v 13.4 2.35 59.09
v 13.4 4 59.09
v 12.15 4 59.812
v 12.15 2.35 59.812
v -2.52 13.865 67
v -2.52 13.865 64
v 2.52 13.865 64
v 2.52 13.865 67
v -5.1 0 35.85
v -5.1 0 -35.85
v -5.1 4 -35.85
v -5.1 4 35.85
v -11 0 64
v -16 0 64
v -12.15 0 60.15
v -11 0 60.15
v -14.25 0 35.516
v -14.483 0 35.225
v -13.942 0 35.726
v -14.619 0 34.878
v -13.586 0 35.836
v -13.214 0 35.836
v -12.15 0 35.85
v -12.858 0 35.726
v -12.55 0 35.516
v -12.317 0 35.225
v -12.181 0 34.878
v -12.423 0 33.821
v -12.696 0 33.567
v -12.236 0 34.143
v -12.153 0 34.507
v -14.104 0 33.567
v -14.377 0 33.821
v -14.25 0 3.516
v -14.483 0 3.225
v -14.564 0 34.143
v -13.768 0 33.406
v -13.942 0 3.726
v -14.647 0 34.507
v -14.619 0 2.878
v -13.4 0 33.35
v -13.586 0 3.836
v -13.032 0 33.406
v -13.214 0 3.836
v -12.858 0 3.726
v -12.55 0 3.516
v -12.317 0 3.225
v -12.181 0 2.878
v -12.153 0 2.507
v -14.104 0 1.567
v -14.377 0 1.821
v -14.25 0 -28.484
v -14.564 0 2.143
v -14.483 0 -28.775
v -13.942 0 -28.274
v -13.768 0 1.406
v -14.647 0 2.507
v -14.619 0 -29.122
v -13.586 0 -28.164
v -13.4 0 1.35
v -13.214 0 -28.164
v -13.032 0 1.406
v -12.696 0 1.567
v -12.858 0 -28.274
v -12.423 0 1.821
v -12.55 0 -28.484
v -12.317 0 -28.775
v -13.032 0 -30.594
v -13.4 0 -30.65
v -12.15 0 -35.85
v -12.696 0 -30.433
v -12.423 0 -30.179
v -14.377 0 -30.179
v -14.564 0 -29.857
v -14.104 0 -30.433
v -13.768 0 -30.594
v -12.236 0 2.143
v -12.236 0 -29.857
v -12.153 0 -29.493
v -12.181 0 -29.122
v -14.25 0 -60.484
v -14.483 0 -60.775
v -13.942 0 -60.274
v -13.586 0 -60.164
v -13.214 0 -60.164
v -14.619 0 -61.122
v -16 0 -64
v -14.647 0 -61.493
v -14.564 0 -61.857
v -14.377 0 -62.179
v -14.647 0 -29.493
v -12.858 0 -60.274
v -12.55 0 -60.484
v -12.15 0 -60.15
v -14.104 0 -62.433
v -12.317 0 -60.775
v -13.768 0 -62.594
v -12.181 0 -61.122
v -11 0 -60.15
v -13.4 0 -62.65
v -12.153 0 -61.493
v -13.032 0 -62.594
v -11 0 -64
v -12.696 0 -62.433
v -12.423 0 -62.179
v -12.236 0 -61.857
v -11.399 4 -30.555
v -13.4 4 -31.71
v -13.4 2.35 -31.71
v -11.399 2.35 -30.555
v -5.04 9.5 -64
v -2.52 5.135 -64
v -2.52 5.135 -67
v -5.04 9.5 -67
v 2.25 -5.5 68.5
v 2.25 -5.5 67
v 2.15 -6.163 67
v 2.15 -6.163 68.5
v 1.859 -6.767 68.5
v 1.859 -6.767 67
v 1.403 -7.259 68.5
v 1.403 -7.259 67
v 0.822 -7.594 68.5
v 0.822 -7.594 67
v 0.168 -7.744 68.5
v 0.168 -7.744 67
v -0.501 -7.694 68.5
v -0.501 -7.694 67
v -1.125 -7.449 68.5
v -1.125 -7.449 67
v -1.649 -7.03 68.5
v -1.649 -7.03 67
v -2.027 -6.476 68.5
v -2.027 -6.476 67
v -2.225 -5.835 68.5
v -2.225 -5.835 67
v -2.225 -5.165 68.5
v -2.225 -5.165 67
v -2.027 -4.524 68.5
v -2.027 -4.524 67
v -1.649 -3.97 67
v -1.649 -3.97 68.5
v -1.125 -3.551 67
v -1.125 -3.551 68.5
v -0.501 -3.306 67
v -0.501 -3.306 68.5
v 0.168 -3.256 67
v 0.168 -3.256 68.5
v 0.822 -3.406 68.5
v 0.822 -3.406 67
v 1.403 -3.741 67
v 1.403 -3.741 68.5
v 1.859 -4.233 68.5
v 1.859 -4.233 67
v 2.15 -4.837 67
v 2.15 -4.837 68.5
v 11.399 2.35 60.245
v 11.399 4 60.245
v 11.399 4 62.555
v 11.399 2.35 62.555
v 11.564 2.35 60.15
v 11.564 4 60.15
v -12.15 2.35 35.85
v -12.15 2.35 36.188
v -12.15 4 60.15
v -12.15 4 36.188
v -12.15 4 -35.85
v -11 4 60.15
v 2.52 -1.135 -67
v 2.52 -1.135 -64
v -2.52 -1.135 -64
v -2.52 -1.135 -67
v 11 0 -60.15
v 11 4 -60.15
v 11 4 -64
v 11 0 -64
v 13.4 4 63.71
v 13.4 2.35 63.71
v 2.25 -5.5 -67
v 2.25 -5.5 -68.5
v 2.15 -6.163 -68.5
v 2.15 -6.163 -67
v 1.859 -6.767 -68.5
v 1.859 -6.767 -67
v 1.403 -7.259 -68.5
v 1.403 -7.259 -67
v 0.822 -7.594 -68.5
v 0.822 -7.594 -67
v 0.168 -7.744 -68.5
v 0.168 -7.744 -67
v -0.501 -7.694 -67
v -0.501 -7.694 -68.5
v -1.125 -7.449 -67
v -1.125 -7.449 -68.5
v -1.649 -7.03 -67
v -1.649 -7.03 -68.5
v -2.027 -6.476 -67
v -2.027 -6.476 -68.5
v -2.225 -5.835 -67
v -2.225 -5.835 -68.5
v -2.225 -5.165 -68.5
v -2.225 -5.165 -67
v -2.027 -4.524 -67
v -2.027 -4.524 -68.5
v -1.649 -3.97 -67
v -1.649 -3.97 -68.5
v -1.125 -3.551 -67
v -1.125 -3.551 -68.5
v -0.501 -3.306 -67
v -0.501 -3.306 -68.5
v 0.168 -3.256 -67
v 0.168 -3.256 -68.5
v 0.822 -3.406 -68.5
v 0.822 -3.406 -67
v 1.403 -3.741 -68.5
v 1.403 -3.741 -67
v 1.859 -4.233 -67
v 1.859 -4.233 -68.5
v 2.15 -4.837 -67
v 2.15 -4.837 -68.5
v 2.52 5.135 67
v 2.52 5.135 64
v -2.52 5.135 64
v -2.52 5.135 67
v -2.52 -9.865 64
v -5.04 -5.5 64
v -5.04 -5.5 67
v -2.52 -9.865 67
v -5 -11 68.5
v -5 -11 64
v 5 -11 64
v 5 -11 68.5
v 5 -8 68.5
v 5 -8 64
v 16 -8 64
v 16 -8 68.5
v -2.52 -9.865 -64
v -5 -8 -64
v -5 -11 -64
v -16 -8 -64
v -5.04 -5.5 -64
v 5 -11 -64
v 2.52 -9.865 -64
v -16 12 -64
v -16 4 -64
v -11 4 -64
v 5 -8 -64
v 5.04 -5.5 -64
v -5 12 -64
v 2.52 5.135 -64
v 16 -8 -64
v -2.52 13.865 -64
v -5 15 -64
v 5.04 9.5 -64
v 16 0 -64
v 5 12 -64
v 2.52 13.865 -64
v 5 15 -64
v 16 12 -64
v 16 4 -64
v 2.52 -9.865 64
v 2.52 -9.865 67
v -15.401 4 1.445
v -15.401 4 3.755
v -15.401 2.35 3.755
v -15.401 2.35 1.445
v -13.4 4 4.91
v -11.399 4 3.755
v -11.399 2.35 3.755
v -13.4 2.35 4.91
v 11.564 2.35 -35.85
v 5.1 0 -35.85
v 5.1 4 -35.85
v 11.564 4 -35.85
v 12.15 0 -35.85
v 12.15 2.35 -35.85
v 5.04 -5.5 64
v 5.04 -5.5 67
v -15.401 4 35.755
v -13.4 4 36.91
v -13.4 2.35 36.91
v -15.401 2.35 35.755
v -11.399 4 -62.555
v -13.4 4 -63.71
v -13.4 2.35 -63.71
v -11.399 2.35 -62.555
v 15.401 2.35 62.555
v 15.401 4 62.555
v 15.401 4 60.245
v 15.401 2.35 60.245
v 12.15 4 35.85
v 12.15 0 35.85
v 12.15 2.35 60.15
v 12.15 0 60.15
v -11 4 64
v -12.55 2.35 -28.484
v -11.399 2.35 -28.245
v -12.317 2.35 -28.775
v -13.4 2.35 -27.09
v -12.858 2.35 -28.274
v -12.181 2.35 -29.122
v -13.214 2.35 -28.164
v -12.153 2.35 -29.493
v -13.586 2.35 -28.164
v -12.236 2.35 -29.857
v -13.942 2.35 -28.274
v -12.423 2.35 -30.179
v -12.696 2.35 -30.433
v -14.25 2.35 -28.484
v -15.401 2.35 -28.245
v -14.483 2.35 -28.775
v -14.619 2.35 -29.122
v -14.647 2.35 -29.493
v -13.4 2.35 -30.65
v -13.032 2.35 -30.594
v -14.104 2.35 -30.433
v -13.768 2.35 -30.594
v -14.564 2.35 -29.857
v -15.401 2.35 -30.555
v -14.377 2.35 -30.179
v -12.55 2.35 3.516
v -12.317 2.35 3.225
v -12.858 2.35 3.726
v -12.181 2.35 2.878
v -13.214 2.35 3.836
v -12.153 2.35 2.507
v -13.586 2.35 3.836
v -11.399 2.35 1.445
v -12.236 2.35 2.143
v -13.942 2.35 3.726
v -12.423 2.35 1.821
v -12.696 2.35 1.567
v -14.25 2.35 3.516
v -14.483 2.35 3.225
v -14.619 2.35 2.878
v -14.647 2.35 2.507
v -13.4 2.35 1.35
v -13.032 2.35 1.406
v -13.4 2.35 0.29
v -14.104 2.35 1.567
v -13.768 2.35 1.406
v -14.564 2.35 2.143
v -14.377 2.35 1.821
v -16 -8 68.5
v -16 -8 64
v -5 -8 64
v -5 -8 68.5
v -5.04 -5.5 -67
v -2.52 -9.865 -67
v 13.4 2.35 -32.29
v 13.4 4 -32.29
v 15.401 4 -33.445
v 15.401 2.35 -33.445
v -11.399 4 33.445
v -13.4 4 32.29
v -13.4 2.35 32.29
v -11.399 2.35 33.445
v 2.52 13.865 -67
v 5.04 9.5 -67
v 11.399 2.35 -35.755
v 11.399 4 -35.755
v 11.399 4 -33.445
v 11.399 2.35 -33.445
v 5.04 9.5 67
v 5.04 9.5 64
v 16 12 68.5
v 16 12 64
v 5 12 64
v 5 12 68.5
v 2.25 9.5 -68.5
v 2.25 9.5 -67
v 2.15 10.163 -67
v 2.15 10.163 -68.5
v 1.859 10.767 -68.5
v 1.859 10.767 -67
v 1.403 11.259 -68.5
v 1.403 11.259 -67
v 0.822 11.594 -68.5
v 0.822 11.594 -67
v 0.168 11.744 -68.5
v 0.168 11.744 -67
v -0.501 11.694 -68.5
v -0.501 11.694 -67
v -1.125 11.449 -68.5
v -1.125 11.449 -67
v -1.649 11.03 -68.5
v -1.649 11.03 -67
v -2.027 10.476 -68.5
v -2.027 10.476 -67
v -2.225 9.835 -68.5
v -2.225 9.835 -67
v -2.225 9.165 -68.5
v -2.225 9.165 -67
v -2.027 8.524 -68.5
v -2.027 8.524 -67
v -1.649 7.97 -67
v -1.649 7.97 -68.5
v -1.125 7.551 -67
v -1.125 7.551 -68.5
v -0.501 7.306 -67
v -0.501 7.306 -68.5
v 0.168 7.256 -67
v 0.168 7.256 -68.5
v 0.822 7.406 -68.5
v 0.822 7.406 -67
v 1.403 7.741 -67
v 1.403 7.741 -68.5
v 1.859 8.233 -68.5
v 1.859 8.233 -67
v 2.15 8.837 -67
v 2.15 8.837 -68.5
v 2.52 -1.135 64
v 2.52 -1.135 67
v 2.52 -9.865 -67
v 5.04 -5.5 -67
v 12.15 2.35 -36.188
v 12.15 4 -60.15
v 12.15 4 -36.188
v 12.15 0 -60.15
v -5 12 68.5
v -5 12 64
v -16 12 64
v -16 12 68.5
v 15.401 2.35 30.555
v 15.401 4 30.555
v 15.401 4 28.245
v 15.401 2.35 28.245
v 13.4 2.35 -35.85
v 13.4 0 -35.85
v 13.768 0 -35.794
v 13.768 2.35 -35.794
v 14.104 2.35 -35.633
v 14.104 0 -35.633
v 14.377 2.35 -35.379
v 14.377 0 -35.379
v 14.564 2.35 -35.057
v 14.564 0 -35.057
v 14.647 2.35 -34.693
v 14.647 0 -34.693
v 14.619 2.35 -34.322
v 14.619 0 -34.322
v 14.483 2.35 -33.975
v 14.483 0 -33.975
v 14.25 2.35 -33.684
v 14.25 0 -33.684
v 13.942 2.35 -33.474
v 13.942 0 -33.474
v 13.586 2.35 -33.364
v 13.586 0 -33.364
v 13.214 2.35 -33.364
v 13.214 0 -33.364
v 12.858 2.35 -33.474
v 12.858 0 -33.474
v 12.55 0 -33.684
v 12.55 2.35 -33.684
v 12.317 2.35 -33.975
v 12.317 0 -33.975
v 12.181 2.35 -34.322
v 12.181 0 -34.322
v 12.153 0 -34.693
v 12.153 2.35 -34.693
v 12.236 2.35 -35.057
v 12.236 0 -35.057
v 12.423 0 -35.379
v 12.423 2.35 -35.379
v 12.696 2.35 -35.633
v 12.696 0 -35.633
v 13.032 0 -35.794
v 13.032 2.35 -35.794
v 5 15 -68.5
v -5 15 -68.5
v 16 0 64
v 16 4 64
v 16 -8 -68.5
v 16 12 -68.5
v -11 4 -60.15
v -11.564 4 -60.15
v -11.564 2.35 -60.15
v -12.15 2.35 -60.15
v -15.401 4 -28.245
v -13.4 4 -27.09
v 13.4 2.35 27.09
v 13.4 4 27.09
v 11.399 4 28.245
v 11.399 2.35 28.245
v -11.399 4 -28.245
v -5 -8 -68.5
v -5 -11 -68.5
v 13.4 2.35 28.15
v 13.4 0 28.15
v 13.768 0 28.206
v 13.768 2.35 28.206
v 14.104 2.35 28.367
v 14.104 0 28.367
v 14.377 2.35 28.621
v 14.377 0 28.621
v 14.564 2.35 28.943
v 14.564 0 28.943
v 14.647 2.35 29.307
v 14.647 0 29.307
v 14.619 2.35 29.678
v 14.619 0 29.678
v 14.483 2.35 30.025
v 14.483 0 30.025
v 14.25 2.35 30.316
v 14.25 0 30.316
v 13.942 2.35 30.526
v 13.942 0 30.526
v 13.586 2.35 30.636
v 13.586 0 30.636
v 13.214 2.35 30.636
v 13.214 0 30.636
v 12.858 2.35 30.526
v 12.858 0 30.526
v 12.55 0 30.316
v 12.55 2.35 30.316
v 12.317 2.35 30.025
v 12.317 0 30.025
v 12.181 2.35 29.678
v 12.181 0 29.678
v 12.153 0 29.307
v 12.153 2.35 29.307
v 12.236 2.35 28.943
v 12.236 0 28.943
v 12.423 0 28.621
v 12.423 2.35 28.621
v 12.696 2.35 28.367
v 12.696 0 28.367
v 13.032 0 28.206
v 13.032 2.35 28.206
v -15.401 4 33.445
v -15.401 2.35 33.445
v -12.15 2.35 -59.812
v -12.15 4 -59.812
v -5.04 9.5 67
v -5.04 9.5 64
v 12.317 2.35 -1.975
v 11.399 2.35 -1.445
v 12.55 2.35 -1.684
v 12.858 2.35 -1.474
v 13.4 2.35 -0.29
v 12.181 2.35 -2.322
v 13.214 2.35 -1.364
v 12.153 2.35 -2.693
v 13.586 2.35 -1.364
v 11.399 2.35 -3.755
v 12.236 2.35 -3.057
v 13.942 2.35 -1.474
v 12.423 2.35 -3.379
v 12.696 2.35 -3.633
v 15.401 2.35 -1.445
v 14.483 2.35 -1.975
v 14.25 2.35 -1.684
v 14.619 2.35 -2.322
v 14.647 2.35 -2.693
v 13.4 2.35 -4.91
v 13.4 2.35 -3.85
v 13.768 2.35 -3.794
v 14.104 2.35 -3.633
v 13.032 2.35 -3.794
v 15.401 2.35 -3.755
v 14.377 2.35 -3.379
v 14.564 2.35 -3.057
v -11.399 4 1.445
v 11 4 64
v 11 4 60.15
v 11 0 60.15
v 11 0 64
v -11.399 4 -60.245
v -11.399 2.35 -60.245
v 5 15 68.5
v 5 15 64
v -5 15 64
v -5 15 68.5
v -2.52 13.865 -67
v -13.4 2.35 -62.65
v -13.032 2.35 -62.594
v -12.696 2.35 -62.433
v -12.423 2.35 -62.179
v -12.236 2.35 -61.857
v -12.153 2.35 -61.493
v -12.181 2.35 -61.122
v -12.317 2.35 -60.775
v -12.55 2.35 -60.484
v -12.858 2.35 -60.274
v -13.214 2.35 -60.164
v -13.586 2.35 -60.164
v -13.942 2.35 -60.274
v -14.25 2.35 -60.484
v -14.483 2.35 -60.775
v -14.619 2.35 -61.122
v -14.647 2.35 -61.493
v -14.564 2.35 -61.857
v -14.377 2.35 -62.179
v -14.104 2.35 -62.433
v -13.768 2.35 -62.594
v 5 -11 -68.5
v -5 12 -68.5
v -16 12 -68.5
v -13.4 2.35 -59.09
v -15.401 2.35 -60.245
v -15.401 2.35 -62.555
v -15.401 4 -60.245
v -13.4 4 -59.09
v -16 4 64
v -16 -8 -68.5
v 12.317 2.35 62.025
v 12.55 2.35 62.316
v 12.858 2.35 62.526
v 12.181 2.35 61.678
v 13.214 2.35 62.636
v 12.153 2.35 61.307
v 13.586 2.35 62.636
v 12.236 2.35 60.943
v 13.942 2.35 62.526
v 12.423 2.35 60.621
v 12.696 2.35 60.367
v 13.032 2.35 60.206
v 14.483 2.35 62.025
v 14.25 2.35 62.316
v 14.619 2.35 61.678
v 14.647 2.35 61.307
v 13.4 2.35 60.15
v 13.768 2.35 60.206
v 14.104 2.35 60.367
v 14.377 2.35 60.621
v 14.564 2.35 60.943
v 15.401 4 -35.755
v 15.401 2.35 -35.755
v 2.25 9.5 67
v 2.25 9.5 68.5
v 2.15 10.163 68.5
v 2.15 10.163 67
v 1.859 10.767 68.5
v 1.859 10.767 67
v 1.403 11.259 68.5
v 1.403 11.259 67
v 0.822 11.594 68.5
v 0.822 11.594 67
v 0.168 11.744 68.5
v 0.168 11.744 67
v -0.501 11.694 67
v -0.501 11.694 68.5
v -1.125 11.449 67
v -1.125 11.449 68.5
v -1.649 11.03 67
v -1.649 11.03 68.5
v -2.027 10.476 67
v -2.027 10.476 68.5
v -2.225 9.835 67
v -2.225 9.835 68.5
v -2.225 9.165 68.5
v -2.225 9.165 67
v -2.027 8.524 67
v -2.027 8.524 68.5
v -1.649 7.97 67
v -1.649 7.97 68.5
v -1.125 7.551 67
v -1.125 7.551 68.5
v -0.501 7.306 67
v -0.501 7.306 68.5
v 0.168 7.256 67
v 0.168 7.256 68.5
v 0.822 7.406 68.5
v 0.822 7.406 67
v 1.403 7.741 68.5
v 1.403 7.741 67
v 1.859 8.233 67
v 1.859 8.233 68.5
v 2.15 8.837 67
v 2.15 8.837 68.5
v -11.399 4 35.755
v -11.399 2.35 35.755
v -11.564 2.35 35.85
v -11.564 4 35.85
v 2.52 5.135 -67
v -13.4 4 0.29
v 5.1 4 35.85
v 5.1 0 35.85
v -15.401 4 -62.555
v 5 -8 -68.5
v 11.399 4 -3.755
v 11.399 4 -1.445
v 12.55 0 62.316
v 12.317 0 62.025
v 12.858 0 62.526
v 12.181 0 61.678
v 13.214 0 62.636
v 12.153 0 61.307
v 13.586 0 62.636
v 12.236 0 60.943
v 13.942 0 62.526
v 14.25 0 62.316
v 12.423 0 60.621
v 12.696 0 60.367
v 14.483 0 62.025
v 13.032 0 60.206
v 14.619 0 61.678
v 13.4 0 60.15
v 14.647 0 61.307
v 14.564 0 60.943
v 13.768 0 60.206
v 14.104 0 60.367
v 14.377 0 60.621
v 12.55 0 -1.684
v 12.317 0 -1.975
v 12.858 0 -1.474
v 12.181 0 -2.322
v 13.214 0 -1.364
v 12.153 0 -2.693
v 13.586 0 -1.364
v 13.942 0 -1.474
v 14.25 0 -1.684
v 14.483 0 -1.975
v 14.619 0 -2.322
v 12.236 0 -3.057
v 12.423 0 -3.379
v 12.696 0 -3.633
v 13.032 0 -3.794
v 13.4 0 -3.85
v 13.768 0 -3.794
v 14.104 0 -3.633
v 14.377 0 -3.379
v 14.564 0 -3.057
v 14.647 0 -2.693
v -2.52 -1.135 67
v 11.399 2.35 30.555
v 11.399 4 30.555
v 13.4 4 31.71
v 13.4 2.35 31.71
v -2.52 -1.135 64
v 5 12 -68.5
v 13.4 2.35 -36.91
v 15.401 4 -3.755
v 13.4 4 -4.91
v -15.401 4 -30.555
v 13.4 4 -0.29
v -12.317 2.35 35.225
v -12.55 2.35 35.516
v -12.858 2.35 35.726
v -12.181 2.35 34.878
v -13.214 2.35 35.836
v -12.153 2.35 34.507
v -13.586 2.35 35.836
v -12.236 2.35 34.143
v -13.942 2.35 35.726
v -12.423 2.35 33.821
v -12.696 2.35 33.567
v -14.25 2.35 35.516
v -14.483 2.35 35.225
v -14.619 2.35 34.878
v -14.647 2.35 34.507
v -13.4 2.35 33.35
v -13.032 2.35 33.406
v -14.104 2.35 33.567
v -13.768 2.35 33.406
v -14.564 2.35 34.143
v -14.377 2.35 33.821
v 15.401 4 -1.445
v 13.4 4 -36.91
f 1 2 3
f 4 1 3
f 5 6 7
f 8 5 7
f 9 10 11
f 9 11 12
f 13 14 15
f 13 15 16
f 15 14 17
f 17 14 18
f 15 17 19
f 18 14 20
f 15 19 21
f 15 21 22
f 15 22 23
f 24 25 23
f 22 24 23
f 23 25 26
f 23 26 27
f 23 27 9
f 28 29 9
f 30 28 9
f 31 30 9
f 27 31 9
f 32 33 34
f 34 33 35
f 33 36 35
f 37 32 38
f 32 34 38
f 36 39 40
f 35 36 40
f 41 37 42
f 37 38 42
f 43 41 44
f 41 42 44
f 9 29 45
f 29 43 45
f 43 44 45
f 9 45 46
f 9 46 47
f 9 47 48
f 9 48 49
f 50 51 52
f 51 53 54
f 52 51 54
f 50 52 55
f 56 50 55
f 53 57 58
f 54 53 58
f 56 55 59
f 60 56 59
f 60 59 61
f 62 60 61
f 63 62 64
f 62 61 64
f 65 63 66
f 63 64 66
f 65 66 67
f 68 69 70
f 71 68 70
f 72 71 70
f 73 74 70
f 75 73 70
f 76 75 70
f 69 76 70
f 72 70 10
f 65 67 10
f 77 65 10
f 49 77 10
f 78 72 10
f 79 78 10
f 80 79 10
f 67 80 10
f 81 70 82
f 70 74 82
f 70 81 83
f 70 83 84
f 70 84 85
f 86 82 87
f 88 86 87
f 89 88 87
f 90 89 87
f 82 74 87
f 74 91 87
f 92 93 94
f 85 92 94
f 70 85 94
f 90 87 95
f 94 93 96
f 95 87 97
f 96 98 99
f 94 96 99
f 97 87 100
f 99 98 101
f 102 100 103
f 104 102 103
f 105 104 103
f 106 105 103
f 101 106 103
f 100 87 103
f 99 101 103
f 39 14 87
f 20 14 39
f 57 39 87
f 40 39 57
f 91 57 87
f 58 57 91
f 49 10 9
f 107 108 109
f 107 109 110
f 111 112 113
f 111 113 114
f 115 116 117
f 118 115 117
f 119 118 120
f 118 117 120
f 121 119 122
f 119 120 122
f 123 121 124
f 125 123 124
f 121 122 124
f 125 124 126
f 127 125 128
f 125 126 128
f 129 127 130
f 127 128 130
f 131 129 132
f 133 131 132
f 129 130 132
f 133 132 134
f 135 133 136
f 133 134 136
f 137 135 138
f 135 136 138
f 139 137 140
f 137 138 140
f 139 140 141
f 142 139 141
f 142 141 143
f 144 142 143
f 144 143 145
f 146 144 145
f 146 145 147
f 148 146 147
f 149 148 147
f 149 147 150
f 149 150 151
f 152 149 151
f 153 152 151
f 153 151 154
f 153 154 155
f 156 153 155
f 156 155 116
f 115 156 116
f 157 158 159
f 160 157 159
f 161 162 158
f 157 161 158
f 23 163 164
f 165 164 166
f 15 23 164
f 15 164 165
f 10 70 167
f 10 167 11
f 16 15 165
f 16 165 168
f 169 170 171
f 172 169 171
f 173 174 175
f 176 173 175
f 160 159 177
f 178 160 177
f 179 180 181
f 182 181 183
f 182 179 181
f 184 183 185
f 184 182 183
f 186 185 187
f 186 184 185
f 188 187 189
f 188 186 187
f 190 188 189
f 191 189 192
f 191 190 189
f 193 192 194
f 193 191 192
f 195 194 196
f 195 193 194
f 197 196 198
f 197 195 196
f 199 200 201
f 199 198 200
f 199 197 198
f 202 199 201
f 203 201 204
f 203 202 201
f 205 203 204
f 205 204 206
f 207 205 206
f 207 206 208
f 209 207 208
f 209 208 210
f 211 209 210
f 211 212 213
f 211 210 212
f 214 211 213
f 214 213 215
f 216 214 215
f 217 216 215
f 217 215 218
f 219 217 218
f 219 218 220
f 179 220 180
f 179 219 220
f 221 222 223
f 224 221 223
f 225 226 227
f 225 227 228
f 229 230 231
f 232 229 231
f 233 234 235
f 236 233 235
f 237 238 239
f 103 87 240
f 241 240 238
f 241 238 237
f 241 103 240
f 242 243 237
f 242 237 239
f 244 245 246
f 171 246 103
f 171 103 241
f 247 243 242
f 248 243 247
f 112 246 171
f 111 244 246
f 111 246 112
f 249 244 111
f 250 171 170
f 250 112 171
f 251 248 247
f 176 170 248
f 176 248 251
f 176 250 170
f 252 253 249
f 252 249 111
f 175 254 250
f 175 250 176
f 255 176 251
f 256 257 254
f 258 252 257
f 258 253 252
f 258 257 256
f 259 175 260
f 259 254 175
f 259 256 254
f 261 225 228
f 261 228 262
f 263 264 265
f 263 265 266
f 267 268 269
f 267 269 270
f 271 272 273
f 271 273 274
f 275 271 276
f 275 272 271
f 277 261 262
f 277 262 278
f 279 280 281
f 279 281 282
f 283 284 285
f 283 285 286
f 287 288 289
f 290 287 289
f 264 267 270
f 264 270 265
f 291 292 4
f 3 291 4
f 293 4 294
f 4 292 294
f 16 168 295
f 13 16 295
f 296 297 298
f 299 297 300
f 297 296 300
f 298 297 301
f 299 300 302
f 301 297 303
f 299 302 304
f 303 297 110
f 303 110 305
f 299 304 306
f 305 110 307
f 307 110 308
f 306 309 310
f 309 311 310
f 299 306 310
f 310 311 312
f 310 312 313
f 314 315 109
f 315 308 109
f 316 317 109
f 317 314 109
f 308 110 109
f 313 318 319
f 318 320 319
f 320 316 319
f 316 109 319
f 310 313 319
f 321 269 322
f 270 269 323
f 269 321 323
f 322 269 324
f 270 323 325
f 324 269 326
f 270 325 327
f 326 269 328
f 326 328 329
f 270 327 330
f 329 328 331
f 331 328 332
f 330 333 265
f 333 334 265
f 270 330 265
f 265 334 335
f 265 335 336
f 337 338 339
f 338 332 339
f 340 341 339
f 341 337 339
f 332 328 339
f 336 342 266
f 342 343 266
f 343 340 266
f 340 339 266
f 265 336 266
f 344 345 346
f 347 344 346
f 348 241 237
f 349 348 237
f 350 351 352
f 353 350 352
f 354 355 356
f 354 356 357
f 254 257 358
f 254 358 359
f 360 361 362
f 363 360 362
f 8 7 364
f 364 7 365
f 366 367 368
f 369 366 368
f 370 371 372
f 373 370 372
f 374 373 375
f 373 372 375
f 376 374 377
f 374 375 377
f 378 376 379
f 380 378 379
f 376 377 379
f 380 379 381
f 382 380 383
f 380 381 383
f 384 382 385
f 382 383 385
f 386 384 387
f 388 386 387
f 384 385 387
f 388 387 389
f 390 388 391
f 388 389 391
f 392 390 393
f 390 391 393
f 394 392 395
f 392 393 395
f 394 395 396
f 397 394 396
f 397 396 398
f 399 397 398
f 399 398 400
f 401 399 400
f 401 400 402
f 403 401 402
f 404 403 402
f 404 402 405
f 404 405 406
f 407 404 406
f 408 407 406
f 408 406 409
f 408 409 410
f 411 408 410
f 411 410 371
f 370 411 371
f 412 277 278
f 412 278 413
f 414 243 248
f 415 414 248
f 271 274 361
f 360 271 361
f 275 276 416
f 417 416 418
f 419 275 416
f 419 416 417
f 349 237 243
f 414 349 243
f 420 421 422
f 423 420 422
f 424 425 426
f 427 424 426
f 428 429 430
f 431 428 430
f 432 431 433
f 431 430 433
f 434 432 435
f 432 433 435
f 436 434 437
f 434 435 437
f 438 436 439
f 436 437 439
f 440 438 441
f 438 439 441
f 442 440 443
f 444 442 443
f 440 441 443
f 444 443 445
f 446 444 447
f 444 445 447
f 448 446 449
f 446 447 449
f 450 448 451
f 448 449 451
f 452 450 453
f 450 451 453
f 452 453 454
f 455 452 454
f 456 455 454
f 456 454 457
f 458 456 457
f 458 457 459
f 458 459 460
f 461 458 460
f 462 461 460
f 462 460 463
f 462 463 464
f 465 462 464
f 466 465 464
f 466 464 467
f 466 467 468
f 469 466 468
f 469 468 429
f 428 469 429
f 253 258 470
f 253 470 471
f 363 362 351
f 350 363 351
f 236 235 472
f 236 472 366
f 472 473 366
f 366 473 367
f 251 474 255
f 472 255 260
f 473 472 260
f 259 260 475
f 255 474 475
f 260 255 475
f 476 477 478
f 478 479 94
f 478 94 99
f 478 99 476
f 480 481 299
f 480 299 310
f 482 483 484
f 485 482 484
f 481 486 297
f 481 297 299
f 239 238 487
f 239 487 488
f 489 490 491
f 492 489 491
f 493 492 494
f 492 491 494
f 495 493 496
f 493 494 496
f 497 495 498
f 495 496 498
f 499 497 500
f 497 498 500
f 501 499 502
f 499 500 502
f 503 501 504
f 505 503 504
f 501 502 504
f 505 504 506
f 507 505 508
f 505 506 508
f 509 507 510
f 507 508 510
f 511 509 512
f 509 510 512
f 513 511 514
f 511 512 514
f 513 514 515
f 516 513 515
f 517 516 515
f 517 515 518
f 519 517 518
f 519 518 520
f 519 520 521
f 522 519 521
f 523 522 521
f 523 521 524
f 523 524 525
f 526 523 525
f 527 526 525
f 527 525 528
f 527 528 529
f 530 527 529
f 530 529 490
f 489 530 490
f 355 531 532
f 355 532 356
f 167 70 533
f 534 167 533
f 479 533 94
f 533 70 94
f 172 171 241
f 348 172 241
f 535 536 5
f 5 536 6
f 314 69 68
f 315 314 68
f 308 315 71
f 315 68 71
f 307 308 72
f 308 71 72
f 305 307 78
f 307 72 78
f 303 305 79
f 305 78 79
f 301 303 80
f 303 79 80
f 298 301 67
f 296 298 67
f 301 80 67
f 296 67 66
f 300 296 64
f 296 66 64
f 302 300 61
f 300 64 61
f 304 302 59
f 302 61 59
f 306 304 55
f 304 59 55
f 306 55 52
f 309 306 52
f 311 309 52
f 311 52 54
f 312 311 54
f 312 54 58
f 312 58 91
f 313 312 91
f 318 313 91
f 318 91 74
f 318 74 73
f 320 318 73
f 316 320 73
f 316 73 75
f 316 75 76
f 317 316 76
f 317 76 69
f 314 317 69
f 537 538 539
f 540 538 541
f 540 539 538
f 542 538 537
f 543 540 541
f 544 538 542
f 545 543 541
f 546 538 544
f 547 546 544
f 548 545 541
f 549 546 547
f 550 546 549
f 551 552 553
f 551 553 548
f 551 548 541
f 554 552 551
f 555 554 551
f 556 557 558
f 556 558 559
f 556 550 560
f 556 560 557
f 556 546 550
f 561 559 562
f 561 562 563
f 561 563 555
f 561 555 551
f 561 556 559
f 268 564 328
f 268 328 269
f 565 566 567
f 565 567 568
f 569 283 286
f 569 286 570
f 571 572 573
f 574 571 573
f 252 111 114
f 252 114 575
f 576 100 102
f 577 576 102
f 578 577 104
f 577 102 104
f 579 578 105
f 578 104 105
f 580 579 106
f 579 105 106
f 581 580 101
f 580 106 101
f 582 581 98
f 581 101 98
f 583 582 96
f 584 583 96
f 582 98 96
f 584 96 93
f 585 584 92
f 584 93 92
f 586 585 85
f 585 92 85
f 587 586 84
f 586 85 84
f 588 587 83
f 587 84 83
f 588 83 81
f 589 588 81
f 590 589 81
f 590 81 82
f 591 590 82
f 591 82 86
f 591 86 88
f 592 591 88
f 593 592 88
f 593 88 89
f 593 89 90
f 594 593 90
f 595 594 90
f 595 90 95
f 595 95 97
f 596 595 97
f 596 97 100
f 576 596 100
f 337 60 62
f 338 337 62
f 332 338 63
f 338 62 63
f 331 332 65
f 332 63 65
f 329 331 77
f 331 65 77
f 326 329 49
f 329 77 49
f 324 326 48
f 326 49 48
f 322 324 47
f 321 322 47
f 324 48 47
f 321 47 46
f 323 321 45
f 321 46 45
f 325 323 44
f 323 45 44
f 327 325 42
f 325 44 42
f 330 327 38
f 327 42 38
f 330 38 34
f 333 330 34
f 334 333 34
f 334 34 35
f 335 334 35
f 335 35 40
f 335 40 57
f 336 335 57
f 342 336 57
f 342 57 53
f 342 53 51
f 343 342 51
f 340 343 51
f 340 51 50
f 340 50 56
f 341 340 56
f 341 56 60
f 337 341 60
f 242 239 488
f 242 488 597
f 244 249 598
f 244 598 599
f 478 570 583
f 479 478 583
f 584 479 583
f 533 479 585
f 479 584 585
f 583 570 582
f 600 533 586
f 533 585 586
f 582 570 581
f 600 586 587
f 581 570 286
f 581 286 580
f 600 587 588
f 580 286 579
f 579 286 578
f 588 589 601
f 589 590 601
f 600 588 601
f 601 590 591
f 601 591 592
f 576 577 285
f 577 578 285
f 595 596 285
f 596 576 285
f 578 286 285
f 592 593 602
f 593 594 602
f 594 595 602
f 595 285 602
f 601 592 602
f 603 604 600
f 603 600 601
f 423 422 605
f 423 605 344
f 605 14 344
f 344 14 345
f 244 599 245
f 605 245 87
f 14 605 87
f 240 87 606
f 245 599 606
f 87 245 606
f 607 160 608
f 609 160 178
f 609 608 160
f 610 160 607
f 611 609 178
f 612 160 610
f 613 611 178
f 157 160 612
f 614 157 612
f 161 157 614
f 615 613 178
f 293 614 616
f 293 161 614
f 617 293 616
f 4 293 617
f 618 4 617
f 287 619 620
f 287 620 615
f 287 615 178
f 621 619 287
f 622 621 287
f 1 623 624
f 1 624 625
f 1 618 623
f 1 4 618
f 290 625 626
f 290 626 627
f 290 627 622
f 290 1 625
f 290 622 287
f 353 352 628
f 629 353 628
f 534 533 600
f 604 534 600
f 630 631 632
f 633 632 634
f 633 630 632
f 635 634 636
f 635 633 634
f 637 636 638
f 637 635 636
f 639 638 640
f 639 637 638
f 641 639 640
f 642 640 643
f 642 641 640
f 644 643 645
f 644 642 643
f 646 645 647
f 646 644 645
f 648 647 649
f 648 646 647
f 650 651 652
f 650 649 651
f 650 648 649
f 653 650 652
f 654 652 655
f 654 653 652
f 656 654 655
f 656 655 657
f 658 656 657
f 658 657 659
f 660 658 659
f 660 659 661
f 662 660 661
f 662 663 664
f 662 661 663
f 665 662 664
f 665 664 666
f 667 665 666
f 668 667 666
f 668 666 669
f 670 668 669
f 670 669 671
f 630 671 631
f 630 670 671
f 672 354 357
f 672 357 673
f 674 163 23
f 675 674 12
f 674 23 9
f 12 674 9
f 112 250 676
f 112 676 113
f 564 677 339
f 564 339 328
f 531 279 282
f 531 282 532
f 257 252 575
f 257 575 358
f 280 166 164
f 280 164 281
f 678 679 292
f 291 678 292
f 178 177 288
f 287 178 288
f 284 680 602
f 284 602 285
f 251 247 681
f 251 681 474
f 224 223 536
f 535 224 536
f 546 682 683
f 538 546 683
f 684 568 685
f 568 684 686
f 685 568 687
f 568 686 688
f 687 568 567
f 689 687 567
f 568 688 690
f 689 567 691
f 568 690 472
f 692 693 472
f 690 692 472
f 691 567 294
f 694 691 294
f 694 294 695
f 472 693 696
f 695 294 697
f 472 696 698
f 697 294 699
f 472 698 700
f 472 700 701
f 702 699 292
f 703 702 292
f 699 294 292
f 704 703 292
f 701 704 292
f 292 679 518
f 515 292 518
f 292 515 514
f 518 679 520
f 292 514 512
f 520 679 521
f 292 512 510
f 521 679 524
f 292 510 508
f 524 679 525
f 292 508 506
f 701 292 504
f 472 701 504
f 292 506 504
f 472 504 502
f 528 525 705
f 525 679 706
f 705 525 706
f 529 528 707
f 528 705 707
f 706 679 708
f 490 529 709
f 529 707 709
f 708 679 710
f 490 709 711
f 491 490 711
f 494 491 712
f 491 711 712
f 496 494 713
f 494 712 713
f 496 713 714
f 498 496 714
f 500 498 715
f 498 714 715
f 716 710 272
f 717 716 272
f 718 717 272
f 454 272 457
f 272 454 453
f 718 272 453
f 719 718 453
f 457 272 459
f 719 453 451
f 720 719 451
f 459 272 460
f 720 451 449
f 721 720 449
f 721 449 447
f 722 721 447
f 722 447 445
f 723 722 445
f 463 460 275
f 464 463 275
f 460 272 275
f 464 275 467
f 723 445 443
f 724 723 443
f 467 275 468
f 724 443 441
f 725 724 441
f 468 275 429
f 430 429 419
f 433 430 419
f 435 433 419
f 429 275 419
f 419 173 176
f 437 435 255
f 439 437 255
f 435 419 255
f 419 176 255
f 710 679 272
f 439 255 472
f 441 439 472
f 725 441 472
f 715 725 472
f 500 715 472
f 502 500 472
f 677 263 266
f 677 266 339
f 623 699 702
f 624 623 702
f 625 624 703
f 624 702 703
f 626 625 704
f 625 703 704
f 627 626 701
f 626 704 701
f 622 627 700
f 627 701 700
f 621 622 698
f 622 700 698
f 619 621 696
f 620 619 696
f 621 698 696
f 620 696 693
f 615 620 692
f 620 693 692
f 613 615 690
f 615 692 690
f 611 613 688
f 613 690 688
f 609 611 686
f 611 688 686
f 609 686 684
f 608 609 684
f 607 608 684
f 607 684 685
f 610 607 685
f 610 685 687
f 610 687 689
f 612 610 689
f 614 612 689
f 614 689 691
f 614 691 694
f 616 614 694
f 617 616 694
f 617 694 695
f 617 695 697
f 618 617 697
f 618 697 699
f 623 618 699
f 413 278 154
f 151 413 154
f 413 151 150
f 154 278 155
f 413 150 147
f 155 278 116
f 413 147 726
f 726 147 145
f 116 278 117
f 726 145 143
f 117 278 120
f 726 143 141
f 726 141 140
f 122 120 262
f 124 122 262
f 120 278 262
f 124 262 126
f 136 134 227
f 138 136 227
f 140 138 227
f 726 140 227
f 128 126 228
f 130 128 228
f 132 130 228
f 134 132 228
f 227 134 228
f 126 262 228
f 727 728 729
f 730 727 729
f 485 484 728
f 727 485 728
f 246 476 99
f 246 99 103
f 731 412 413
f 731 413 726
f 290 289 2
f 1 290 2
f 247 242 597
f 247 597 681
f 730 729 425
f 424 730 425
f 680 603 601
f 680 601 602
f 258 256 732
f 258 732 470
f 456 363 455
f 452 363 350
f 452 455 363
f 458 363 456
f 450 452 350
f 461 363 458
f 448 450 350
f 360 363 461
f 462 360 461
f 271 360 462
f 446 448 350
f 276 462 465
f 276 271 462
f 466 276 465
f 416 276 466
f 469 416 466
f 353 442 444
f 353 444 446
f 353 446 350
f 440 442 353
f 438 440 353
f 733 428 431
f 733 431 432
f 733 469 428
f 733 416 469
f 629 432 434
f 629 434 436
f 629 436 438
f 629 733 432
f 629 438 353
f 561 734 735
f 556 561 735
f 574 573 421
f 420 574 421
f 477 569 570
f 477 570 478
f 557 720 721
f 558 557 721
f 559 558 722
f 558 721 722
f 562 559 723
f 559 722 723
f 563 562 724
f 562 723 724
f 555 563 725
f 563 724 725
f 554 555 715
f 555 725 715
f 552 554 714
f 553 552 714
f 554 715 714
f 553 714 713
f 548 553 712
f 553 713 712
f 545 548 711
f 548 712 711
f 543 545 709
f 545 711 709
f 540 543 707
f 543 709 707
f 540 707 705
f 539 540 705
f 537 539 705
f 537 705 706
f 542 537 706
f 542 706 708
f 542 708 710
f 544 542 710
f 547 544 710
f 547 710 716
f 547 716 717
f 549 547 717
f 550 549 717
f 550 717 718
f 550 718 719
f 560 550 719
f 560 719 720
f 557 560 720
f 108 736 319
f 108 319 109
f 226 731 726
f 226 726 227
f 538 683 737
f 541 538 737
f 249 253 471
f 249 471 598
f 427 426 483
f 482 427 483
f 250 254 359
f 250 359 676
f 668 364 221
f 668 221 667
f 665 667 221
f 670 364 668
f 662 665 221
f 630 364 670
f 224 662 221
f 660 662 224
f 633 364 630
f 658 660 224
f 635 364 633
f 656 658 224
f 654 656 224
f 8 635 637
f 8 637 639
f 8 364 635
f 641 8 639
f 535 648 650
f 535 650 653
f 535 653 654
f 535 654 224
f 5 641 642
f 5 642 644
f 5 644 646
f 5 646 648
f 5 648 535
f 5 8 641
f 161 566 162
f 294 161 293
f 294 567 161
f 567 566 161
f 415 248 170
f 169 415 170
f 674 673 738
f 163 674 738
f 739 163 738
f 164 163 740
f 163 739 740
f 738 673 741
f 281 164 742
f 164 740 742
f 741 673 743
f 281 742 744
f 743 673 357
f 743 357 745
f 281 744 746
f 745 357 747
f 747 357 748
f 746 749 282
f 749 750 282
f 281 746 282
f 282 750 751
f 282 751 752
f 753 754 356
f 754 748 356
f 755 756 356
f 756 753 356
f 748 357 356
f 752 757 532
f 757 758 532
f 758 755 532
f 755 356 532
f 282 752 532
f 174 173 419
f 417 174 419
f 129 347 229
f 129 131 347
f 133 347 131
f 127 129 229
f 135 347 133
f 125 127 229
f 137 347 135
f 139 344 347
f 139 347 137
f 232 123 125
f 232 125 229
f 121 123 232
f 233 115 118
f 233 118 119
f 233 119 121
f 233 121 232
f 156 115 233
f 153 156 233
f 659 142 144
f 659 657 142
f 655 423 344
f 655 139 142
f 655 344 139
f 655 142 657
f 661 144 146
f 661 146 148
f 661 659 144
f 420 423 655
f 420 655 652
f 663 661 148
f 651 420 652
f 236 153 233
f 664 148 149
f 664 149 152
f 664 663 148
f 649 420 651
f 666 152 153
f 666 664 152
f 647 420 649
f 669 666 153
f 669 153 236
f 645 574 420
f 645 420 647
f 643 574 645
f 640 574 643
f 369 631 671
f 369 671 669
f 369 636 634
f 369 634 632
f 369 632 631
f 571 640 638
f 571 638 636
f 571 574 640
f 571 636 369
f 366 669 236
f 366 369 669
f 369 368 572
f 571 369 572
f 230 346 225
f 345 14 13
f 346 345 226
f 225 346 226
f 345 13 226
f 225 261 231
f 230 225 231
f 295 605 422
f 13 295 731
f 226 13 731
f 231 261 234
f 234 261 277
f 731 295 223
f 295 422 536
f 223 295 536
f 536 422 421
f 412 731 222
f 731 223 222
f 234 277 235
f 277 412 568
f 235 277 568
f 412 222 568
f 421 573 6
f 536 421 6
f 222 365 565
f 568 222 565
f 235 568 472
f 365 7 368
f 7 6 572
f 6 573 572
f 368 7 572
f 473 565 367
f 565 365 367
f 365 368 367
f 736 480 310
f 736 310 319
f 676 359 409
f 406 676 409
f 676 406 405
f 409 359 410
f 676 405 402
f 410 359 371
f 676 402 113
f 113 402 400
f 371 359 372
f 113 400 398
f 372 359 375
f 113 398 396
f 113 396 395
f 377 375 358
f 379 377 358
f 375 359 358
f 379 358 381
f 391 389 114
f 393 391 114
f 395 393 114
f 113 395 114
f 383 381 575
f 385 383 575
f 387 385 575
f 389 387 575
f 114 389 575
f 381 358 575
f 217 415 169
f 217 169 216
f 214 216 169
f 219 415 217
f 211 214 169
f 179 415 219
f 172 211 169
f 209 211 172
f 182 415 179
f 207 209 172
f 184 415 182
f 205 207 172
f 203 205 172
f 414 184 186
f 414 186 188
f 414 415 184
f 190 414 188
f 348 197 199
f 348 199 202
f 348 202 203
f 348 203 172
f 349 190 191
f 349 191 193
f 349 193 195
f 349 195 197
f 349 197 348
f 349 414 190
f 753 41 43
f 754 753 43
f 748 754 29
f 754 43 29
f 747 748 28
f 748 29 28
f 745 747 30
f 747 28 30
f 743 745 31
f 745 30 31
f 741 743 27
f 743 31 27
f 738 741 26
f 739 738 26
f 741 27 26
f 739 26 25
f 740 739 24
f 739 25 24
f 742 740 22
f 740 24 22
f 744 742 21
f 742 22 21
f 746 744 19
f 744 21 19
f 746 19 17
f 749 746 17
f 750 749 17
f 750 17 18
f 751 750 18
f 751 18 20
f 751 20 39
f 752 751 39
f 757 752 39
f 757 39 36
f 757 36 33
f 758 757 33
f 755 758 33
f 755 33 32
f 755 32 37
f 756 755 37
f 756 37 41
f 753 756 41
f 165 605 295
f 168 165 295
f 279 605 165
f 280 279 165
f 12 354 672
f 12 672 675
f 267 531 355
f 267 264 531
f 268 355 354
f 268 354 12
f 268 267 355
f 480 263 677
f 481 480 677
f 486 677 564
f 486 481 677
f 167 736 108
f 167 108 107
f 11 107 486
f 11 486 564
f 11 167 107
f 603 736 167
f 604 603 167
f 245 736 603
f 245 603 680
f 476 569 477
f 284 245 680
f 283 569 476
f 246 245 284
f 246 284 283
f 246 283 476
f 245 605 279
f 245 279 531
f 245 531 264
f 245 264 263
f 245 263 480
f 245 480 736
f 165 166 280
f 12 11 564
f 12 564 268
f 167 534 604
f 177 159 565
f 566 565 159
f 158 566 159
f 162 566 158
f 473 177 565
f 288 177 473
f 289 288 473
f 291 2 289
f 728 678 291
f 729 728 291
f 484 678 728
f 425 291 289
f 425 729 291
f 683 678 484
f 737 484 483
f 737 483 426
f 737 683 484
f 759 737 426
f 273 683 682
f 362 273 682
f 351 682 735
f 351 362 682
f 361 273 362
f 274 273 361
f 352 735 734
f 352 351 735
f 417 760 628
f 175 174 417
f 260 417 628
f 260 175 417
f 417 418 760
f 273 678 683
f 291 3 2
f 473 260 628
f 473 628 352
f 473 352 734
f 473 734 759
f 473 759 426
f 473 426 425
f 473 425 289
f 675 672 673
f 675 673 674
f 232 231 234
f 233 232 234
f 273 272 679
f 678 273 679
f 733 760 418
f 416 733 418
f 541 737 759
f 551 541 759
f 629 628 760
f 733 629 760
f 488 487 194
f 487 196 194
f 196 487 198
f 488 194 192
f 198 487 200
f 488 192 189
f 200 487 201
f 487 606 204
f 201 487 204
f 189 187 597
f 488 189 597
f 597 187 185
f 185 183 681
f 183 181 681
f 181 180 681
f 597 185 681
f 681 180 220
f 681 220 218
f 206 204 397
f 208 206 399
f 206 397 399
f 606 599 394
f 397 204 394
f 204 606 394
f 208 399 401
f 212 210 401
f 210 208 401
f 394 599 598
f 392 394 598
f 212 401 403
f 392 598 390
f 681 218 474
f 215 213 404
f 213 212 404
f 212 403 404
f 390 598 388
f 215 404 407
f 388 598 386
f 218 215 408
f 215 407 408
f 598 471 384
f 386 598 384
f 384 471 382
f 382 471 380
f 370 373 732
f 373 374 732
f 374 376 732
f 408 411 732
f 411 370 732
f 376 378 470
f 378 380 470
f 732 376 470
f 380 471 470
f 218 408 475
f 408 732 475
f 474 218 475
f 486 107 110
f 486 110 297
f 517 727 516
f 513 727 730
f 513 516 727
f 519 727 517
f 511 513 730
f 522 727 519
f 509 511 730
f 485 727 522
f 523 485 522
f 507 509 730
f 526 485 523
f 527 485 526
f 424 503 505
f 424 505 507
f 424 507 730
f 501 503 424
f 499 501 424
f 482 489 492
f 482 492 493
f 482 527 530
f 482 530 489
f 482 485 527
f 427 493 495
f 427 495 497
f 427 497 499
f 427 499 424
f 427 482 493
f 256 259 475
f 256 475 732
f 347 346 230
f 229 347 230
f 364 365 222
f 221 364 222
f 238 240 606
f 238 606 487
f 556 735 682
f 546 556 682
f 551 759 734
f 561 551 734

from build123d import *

# Parameters (mm, degrees)
SKETCH1_W               = 32
SKETCH1_H               = 128
BOSS_EXTRUDE1_DEPTH     = 4
SKETCH4_R               = 1.25
CUT_EXTRUDE2_DEPTH      = 10
SKETCH5_R               = 1.25
CUT_EXTRUDE3_DEPTH      = 10
CUT_EXTRUDE4_DEPTH      = 1.65
LPATTERN3_COUNT         = 4
LPATTERN3_PITCH         = 32
CUT_EXTRUDE5_DEPTH      = 1.65
LPATTERN4_COUNT         = 4
LPATTERN4_PITCH         = 32
SKETCH8_W               = 24.3
SKETCH8_H               = 24.3
CUT_EXTRUDE6_DEPTH      = 10
BOSS_EXTRUDE2_DEPTH     = 4.5
SKETCH11_W              = 10.2
SKETCH11_H              = 71.7
CUT_EXTRUDE7_DEPTH      = 72.92530848
CUT_EXTRUDE8_DEPTH      = 3
SKETCH12_R              = 2.25
CUT_EXTRUDE9_DEPTH      = 3
MIRROR3_COPY_1_DEPTH    = 3
MIRROR3_COPY_2_SKETCH_R = 2.25
MIRROR3_COPY_2_DEPTH    = 3
SKETCH14_W              = 22
SKETCH14_H              = 3.85
CUT_EXTRUDE13_DEPTH     = 10


with BuildPart() as part:
    # Sketch1 → Boss-Extrude1 (new body)
    with BuildSketch(Plane(origin=(0, 0, 0), x_dir=(1, 0, 0), z_dir=(0, 1, 0))):
        Rectangle(SKETCH1_W, SKETCH1_H)
    extrude(amount=BOSS_EXTRUDE1_DEPTH)

    # Sketch4 → Cut-Extrude2 (cut)
    with BuildSketch(Plane.XZ):
        with Locations(Location((13.4, 61.4, 0), (0, 0, 270))):
            Circle(SKETCH4_R)
    cut_extrude2 = extrude(amount=-CUT_EXTRUDE2_DEPTH, mode=Mode.SUBTRACT)

    # Sketch5 → Cut-Extrude3 (cut)
    with BuildSketch(Plane.XZ):
        with Locations(Location((-13.4, -61.4, 0), (0, 0, 270))):
            Circle(SKETCH5_R)
    cut_extrude3 = extrude(amount=-CUT_EXTRUDE3_DEPTH, mode=Mode.SUBTRACT)

    # Sketch6 → Cut-Extrude4 (cut)
    with BuildSketch(Plane(origin=(0, 4, 0), x_dir=(1, 0, 0), z_dir=(0, 1, 0))):
        Polygon((-15.400518683, 62.555), (-13.4, 63.71), (-11.399481317, 62.555), (-11.399481317, 60.245), (-13.4, 59.09), (-15.400518683, 60.245), align=None)
    cut_extrude4 = extrude(amount=-CUT_EXTRUDE4_DEPTH, mode=Mode.SUBTRACT)

    # LPattern3: Cut-Extrude3, Cut-Extrude4 ×4
    with Locations(*[(0, 0, i * LPATTERN3_PITCH) for i in range(1, LPATTERN3_COUNT)]):
        add(cut_extrude3, mode=Mode.SUBTRACT)
        add(cut_extrude4, mode=Mode.SUBTRACT)

    # Sketch7 → Cut-Extrude5 (cut)
    with BuildSketch(Plane(origin=(0, 4, 0), x_dir=(1, 0, 0), z_dir=(0, 1, 0))):
        Polygon((13.4, -59.09), (11.399481317, -60.245), (11.399481317, -62.555), (13.4, -63.71), (15.400518683, -62.555), (15.400518683, -60.245), align=None)
    cut_extrude5 = extrude(amount=-CUT_EXTRUDE5_DEPTH, mode=Mode.SUBTRACT)

    # LPattern4: Cut-Extrude2, Cut-Extrude5 ×4
    with Locations(*[(0, 0, -i * LPATTERN4_PITCH) for i in range(1, LPATTERN4_COUNT)]):
        add(cut_extrude2, mode=Mode.SUBTRACT)
        add(cut_extrude5, mode=Mode.SUBTRACT)

    # Sketch8 → Cut-Extrude6 (cut)
    with BuildSketch(Plane.XZ):
        with Locations((0, 48)):
            Rectangle(SKETCH8_W, SKETCH8_H)
    cut_extrude6 = extrude(amount=-CUT_EXTRUDE6_DEPTH, mode=Mode.SUBTRACT)

    # Mirror1: Cut-Extrude6 across plane
    add(cut_extrude6.mirror(Plane.XY), mode=Mode.SUBTRACT)

    # Sketch9 → Boss-Extrude2 (add)
    with BuildSketch(Plane(origin=(0, 0, -64), x_dir=(-1, 0, 0), z_dir=(0, 0, -1))):
        Polygon((-16, 12), (-5, 12), (-5, 15), (5, 15), (5, 12), (16, 12), (16, -8), (5, -8), (5, -11), (-5, -11), (-5, -8), (-16, -8), align=None)
    boss_extrude2 = extrude(amount=BOSS_EXTRUDE2_DEPTH)

    # Sketch11 → Cut-Extrude7 (cut, through all)
    with BuildSketch(Plane.XZ):
        Rectangle(SKETCH11_W, SKETCH11_H)
    extrude(amount=-CUT_EXTRUDE7_DEPTH, mode=Mode.SUBTRACT)

    # Sketch10 → Cut-Extrude8 (cut)
    with BuildSketch(Plane.XY.offset(-64)):
        Polygon((-2.52, 13.864768035), (2.52, 13.864768035), (5.04, 9.5), (2.52, 5.135231965), (-2.52, 5.135231965), (-5.04, 9.5), align=None)
    cut_extrude8 = extrude(amount=-CUT_EXTRUDE8_DEPTH, mode=Mode.SUBTRACT)

    # Sketch12 → Cut-Extrude9 (cut)
    with BuildSketch(Plane.XY.offset(-67)):
        with Locations((0, 9.5)):
            Circle(SKETCH12_R)
    cut_extrude9 = extrude(amount=-CUT_EXTRUDE9_DEPTH, mode=Mode.SUBTRACT)

    # Mirror2: Cut-Extrude8, Cut-Extrude9 across plane
    add(cut_extrude8.mirror(Plane.ZX.offset(2)), mode=Mode.SUBTRACT)
    add(cut_extrude9.mirror(Plane.ZX.offset(2)), mode=Mode.SUBTRACT)

    # Mirror3: Boss-Extrude2, Cut-Extrude8, Cut-Extrude9 across plane
    add(boss_extrude2.mirror(Plane.XY))
    add(cut_extrude8.mirror(Plane.XY), mode=Mode.SUBTRACT)
    add(cut_extrude9.mirror(Plane.XY), mode=Mode.SUBTRACT)

    # Mirror3 copy 1 sketch → Mirror3 copy 1 (cut)
    with BuildSketch(Plane(origin=(0, 4, 64), x_dir=(1, 0, 0), z_dir=(0, 0, -1))):
        Polygon((-2.52, 13.864768035), (2.52, 13.864768035), (5.04, 9.5), (2.52, 5.135231965), (-2.52, 5.135231965), (-5.04, 9.5), align=None)
    extrude(amount=-MIRROR3_COPY_1_DEPTH, mode=Mode.SUBTRACT)

    # Mirror3 copy 2 sketch → Mirror3 copy 2 (cut)
    with BuildSketch(Plane(origin=(0, 4, 67), x_dir=(1, 0, 0), z_dir=(0, 0, -1))):
        with Locations((0, 9.5)):
            Circle(MIRROR3_COPY_2_SKETCH_R)
    extrude(amount=-MIRROR3_COPY_2_DEPTH, mode=Mode.SUBTRACT)

    # Sketch14 → Cut-Extrude13 (cut)
    with BuildSketch(Plane.XZ):
        with Locations((0, 62.075)):
            Rectangle(SKETCH14_W, SKETCH14_H)
    cut_extrude13 = extrude(amount=-CUT_EXTRUDE13_DEPTH, mode=Mode.SUBTRACT)

    # Mirror4: Cut-Extrude13 across plane
    add(cut_extrude13.mirror(Plane.XY), mode=Mode.SUBTRACT)


solid = part.part
